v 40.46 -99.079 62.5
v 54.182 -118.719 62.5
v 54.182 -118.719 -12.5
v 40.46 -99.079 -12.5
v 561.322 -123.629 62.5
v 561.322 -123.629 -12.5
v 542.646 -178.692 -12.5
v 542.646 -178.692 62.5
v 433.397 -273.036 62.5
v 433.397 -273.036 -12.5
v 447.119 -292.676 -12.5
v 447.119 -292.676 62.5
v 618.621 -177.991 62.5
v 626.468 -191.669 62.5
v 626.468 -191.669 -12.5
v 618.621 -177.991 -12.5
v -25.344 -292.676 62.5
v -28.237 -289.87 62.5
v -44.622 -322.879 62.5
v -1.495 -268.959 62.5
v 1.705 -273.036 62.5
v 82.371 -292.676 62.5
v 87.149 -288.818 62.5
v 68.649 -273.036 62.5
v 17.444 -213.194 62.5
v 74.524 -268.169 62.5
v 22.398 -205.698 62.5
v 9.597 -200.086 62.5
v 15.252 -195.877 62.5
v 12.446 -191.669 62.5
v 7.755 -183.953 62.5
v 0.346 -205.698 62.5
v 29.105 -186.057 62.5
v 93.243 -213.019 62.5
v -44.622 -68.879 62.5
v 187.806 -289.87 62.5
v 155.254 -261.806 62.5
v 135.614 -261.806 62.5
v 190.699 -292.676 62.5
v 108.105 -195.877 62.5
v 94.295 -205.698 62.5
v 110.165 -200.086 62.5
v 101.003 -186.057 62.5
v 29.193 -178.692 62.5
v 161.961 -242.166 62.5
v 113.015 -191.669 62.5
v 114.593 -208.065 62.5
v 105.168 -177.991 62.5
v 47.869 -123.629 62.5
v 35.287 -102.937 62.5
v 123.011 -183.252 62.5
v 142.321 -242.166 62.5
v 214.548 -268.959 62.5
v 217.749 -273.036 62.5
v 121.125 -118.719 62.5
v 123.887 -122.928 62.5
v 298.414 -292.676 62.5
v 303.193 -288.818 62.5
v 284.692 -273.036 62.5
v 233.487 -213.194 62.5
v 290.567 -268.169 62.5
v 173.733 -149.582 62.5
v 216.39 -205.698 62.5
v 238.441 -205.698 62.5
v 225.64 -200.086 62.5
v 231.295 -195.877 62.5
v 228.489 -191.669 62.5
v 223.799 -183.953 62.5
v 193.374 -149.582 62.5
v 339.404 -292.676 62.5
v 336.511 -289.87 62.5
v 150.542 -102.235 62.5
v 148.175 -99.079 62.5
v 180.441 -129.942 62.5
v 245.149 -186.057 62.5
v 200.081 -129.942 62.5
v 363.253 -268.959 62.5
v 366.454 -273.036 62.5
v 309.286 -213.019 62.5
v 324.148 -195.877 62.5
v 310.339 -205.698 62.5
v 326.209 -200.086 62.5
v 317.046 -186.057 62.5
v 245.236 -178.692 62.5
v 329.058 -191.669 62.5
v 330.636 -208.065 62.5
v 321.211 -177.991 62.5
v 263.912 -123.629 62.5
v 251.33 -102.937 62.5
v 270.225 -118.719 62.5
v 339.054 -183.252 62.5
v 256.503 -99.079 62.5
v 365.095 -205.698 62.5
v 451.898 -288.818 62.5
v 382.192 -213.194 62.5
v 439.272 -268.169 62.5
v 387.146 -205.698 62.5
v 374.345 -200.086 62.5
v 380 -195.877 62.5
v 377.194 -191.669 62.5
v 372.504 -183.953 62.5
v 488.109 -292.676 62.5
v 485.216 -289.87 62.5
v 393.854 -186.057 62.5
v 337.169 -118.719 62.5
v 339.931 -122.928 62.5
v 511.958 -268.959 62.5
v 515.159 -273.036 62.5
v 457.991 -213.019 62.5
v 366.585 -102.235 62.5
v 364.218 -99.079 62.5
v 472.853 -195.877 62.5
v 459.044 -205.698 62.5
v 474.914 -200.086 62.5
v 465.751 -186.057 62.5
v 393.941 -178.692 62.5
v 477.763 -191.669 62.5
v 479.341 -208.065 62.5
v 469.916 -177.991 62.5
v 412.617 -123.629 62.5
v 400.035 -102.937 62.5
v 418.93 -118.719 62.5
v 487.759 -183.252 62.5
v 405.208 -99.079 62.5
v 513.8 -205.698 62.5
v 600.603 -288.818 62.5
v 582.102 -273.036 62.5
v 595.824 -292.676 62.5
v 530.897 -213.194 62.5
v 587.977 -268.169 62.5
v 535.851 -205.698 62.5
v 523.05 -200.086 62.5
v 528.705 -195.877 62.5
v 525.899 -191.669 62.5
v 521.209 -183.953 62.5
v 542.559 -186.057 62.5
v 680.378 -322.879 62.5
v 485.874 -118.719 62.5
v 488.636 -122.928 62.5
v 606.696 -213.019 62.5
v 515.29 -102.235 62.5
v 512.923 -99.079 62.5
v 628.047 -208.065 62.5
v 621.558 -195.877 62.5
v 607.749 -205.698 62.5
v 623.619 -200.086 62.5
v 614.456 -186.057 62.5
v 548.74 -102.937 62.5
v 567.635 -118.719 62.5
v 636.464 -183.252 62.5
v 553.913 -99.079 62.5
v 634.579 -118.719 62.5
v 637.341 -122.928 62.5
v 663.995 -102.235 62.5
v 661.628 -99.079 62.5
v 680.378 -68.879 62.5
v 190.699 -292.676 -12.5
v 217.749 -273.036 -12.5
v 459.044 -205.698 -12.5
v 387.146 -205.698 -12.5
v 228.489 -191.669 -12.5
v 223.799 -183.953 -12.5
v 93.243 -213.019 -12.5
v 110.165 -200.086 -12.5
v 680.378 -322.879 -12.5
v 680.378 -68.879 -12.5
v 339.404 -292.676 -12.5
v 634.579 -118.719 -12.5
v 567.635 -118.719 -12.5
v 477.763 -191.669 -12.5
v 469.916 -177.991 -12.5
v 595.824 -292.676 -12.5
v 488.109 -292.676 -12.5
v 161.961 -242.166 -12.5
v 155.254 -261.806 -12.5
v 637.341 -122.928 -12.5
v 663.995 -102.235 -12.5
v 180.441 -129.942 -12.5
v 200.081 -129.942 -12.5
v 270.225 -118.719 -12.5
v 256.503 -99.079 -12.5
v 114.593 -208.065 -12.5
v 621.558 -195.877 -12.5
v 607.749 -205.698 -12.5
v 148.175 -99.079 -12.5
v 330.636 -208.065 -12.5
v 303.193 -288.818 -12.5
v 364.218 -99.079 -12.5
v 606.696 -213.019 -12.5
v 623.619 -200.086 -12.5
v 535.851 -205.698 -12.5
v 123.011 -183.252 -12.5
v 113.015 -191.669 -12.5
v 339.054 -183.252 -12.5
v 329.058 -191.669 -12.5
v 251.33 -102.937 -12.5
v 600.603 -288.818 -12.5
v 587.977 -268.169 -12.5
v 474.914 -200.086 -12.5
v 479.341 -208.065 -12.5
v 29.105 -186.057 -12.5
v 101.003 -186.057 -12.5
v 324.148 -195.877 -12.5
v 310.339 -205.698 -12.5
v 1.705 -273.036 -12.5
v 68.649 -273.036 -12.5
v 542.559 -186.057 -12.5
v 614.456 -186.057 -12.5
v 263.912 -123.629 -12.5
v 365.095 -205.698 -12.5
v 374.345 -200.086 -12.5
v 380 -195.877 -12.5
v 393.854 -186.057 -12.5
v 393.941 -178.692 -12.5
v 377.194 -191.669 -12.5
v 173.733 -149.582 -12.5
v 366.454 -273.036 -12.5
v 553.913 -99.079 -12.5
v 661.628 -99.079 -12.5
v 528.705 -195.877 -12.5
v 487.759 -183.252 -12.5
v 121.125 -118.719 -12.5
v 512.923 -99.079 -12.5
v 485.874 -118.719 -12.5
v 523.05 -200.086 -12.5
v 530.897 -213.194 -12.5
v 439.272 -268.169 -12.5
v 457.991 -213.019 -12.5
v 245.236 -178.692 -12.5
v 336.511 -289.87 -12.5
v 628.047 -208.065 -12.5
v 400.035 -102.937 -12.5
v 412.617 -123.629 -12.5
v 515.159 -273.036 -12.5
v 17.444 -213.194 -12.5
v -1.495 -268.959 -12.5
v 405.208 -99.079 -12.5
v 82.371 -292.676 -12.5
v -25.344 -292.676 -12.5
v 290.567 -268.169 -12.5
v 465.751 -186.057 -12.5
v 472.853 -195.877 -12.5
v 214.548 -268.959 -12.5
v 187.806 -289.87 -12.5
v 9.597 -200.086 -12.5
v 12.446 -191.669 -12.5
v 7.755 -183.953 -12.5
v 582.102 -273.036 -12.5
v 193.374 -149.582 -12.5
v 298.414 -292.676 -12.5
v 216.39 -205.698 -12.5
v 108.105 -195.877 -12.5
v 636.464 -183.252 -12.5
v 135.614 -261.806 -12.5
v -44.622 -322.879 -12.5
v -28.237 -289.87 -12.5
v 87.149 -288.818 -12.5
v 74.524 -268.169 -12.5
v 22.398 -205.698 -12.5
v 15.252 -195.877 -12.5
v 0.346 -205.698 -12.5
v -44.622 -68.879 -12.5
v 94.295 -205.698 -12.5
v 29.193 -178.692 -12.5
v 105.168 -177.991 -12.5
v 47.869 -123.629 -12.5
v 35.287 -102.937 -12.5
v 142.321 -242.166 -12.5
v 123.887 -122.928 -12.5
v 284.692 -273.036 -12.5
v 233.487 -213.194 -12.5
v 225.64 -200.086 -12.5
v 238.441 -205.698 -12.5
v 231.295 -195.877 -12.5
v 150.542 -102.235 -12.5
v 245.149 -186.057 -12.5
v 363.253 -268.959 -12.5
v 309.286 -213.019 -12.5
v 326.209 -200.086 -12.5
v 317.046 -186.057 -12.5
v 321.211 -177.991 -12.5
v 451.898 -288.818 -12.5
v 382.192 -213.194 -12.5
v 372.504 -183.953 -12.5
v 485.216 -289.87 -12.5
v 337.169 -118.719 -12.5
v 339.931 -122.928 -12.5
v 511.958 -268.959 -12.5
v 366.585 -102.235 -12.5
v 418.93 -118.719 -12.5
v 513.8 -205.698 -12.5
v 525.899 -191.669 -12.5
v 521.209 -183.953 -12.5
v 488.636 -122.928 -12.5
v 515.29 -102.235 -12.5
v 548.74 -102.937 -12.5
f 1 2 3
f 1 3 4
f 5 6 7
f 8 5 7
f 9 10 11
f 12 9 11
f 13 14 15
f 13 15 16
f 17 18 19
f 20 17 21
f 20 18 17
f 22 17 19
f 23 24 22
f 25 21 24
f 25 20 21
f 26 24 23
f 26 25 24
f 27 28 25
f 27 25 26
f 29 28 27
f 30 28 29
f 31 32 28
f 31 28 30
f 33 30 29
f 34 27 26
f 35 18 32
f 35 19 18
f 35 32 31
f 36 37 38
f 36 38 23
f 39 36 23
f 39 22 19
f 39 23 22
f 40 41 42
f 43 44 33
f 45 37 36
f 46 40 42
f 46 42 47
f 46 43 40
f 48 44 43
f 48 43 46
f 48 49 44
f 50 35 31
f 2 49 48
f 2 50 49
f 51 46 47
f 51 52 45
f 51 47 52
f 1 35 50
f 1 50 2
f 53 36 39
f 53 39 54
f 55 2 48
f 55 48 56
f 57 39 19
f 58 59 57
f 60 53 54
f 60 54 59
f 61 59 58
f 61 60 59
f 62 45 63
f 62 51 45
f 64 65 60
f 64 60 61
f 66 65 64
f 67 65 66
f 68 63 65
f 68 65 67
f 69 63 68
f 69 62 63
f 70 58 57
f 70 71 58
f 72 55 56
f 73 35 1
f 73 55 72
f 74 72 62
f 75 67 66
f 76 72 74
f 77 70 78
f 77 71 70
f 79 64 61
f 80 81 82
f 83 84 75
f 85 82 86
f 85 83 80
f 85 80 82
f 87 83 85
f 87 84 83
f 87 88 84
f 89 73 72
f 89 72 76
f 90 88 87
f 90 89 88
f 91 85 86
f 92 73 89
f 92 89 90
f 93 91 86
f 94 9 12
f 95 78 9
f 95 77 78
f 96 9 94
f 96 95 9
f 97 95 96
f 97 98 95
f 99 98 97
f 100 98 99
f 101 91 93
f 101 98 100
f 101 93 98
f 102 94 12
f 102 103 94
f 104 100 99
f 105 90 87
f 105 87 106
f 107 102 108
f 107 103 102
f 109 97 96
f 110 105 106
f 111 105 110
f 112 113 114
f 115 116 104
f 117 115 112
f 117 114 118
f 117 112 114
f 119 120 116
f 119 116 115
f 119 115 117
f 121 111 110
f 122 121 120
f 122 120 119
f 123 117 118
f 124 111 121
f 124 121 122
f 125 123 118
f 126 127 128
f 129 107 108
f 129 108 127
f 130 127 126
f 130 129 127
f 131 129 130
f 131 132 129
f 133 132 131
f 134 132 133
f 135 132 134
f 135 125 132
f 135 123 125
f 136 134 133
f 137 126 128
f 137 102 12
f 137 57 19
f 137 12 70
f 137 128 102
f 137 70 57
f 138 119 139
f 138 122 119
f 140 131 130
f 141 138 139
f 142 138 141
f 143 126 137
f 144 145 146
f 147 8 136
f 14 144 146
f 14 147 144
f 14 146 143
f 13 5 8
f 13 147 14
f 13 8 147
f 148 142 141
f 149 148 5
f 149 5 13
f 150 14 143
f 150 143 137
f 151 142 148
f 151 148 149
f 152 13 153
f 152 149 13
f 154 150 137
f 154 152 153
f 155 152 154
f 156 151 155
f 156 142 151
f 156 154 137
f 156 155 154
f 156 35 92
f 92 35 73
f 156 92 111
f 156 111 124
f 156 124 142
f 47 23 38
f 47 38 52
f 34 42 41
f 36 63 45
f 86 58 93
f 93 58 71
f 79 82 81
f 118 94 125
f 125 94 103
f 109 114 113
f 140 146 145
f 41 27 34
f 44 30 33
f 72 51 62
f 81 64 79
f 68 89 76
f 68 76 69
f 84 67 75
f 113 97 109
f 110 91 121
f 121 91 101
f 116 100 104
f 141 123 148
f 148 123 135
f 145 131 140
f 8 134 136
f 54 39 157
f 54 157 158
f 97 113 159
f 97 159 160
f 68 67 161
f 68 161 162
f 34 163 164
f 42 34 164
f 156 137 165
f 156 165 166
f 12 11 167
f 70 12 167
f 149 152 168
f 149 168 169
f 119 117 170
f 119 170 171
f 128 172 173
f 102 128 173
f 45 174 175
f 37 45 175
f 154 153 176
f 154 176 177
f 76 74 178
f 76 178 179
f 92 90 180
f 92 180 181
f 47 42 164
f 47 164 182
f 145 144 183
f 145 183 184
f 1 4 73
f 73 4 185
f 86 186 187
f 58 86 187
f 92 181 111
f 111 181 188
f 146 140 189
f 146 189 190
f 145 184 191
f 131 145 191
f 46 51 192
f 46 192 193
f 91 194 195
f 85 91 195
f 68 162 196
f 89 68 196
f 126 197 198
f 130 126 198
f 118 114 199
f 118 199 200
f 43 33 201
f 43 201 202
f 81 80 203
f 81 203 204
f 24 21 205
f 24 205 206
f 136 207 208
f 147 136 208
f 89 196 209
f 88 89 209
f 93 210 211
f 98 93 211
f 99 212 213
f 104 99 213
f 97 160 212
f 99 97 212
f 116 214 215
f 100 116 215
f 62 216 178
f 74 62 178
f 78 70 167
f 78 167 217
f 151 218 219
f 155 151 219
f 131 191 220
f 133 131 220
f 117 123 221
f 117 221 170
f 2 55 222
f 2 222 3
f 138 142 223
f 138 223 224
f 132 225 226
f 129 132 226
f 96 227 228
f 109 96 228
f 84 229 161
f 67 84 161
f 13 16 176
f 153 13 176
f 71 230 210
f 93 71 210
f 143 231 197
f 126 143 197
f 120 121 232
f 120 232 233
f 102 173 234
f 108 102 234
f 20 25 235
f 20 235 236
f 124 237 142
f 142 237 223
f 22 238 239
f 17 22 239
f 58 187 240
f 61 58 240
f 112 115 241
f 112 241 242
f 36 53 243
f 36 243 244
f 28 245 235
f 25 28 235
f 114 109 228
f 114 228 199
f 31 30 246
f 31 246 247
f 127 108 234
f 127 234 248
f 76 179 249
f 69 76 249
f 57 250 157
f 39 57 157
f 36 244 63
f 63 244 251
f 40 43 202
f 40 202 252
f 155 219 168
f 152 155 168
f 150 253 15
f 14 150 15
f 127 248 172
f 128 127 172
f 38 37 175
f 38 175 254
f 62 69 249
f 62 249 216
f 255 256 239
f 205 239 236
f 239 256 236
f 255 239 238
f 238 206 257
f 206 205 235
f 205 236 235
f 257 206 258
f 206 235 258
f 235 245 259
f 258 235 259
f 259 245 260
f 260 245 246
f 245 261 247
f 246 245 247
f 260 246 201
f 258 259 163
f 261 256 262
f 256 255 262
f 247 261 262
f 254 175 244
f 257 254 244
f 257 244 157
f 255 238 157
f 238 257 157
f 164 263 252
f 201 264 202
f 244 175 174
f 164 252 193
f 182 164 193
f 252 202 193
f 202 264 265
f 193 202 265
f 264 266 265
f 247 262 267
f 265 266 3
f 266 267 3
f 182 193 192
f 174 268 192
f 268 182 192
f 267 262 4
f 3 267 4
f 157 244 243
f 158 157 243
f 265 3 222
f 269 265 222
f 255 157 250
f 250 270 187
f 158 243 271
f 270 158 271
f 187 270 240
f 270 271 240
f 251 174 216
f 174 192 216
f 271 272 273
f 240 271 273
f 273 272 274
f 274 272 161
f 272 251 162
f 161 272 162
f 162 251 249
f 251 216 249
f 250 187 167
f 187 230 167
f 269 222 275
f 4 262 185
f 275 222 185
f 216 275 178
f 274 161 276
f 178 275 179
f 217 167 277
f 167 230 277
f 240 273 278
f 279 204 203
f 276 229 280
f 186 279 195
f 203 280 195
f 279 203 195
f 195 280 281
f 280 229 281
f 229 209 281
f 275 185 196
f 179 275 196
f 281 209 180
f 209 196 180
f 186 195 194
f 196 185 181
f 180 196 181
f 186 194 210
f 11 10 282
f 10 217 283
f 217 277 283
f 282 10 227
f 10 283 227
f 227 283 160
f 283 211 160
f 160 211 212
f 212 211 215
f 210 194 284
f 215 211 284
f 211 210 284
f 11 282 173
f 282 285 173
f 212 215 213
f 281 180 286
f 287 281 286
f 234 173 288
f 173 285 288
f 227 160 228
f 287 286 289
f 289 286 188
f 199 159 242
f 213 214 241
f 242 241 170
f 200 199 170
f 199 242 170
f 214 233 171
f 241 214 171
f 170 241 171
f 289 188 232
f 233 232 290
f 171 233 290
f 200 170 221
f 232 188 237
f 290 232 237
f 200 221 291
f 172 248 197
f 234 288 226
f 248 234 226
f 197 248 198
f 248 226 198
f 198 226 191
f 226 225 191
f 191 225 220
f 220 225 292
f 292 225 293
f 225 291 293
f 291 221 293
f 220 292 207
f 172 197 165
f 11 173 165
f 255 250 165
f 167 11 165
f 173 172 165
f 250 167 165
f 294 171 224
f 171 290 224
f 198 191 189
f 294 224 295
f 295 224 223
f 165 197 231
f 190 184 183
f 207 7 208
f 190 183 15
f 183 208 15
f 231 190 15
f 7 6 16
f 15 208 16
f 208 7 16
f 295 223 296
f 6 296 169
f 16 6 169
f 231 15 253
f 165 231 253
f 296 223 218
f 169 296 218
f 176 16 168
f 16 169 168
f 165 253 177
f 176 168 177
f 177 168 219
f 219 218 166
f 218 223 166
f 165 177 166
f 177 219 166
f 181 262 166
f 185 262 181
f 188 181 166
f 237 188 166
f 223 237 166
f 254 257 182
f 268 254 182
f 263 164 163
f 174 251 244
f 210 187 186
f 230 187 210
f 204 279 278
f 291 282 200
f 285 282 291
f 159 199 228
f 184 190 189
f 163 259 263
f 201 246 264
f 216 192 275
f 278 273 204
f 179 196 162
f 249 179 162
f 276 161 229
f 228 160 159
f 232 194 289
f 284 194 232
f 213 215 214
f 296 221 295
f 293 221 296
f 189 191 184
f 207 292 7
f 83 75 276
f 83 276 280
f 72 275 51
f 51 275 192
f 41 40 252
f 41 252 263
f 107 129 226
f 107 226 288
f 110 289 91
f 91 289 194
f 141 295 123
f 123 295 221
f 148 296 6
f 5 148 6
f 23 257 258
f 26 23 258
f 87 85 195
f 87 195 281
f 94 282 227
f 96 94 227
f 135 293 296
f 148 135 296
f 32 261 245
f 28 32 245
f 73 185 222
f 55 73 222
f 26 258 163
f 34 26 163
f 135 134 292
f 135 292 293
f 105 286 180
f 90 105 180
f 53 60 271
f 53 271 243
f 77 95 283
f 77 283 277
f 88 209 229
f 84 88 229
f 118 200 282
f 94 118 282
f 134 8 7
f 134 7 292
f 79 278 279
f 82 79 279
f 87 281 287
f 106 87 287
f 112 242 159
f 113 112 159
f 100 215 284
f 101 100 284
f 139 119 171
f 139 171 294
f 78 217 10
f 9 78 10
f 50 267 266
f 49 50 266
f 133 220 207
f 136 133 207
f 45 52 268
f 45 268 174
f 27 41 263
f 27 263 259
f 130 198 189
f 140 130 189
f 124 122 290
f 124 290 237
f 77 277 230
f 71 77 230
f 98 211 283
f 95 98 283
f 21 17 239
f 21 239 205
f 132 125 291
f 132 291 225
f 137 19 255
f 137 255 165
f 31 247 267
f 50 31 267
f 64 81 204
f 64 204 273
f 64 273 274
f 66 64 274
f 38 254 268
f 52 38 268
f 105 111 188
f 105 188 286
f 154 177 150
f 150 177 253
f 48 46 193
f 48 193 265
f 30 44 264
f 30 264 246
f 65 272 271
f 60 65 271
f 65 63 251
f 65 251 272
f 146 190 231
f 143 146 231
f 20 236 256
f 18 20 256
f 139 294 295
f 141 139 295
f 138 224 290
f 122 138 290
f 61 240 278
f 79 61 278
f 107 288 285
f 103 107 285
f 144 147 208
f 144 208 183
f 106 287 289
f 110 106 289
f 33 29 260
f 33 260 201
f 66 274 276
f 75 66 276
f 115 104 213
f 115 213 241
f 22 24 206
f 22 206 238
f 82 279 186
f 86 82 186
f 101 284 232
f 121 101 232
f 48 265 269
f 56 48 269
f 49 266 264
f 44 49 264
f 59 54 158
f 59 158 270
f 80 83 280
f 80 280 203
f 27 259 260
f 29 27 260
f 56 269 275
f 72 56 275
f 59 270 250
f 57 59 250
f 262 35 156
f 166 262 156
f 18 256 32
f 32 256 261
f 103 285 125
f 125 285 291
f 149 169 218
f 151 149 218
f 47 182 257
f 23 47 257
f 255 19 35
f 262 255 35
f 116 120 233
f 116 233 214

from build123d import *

# Parameters (mm, degrees)
SKETCH_1_W            = 500
SKETCH_1_H            = 220
EXTRUDE_1_DEPTH       = 50
CUT_EXTRUDE_1_DEPTH   = 65
SKETCH_3_W            = 24.993501938
SKETCH_3_H            = 24.754329671
EXTRUDE_2_DEPTH       = 50
SKETCH_4_W            = 557.488309353
SKETCH_4_H            = 263.064748201
SKETCH_4_W_2          = 497.488309353
SKETCH_4_H_2          = 203.064748201
CUT_EXTRUDE_1_2_DEPTH = 84
SCALE_1_SCALE         = 1.5
SKETCH_8_W            = 822.232464029
SKETCH_8_H            = 353.597122302
SKETCH_8_W_2          = 722.232464029
SKETCH_8_H_2          = 253.597122302
CUT_EXTRUDE_2_DEPTH   = 180
SKETCH_9_W            = 725
SKETCH_9_H            = 254
SKETCH_9_W_2          = 708.249145706
SKETCH_9_H_2          = 240.894932361
EXTRUDE_4_DEPTH       = 75


with BuildPart() as part:
    # Эскиз1 → Бобышка-Вытянуть1 (new body)
    with BuildSketch(Plane.XY):
        with Locations((315.178539616, -203.237931197)):
            Rectangle(SKETCH_1_W, SKETCH_1_H)
        Polygon((203.546220768, -131.339893042), (185.513397027, -144.433418222), (140.884350264, -144.433418222), (131.736418609, -131.339893042), align=None, mode=Mode.SUBTRACT)
        Polygon((159.677066091, -260.404641243), (87.867263933, -260.404641243), (105.900087674, -247.311116064), (150.529134437, -247.311116064), align=None, mode=Mode.SUBTRACT)
        Polygon((116.392443789, -207.416781531), (103.766544509, -244.593040524), (85.938307098, -258.534137646), (104.994062494, -202.419029733), (111.160879041, -198.678022538), align=None, mode=Mode.SUBTRACT)
        Polygon((109.933361055, -187.922626855), (128.287677602, -133.911835488), (136.67571717, -147.706799517), (124.225177602, -184.41543261), (113.060609257, -193.066511747), align=None, mode=Mode.SUBTRACT)
        Polygon((181.158630839, -203.997267143), (162.86276753, -257.832698797), (154.445501343, -244.066961387), (166.92526753, -207.299875056), (178.20674235, -198.678022538), align=None, mode=Mode.SUBTRACT)
        Polygon((174.874907818, -183.947806711), (187.354674005, -147.239173618), (205.124458178, -133.444209589), (186.770141631, -187.455000956), (180.106472566, -193.066511747), align=None, mode=Mode.SUBTRACT)
        Polygon((172.098379041, -189.325504553), (176.833091271, -195.872267143), (167.626706379, -202.419029733), (119.695051703, -202.419029733), (114.931112854, -195.872267143), (124.166724365, -189.325504553), align=None, mode=Mode.SUBTRACT)
        Polygon((188.173019329, -260.404641243), (192.615465372, -247.311116064), (205.708990552, -247.311116064), (201.266544509, -260.404641243), align=None, mode=Mode.SUBTRACT)
        Polygon((220.585339473, -165.00895779), (225.057012134, -151.91543261), (238.150537314, -151.91543261), (233.678864652, -165.00895779), align=None, mode=Mode.SUBTRACT)
        Polygon((347.574997746, -131.339893042), (329.542174005, -144.433418222), (284.913127242, -144.433418222), (275.765195588, -131.339893042), align=None, mode=Mode.SUBTRACT)
        Polygon((303.70584307, -260.404641243), (231.896040911, -260.404641243), (249.928864652, -247.311116064), (294.557911415, -247.311116064), align=None, mode=Mode.SUBTRACT)
        Polygon((260.421220768, -207.416781531), (247.795321487, -244.593040524), (229.967084077, -258.534137646), (249.022839473, -202.419029733), (255.189656019, -198.678022538), align=None, mode=Mode.SUBTRACT)
        Polygon((253.962138034, -187.922626855), (272.31645458, -133.911835488), (280.704494149, -147.706799517), (268.25395458, -184.41543261), (257.089386235, -193.066511747), align=None, mode=Mode.SUBTRACT)
        Polygon((325.187407818, -203.997267143), (306.891544509, -257.832698797), (298.474278321, -244.066961387), (310.954044509, -207.299875056), (322.235519329, -198.678022538), align=None, mode=Mode.SUBTRACT)
        Polygon((318.903684796, -183.947806711), (331.383450983, -147.239173618), (349.153235156, -133.444209589), (330.798918609, -187.455000956), (324.135249545, -193.066511747), align=None, mode=Mode.SUBTRACT)
        Polygon((316.127156019, -189.325504553), (320.86186825, -195.872267143), (311.655483357, -202.419029733), (263.723828681, -202.419029733), (258.959889832, -195.872267143), (268.195501343, -189.325504553), align=None, mode=Mode.SUBTRACT)
        Polygon((446.711688393, -131.339893042), (428.678864652, -144.433418222), (384.04981789, -144.433418222), (374.901886235, -131.339893042), align=None, mode=Mode.SUBTRACT)
        Polygon((402.842533717, -260.404641243), (331.032731559, -260.404641243), (349.0655553, -247.311116064), (393.694602063, -247.311116064), align=None, mode=Mode.SUBTRACT)
        Polygon((359.557911415, -207.416781531), (346.932012134, -244.593040524), (329.103774724, -258.534137646), (348.15953012, -202.419029733), (354.326346667, -198.678022538), align=None, mode=Mode.SUBTRACT)
        Polygon((353.098828681, -187.922626855), (371.453145228, -133.911835488), (379.841184796, -147.706799517), (367.390645228, -184.41543261), (356.226076883, -193.066511747), align=None, mode=Mode.SUBTRACT)
        Polygon((424.324098465, -203.997267143), (406.028235156, -257.832698797), (397.610968969, -244.066961387), (410.090735156, -207.299875056), (421.372209976, -198.678022538), align=None, mode=Mode.SUBTRACT)
        Polygon((418.040375444, -183.947806711), (430.520141631, -147.239173618), (448.289925804, -133.444209589), (429.935609257, -187.455000956), (423.271940192, -193.066511747), align=None, mode=Mode.SUBTRACT)
        Polygon((415.263846667, -189.325504553), (419.998558897, -195.872267143), (410.792174005, -202.419029733), (362.860519329, -202.419029733), (358.09658048, -195.872267143), (367.332191991, -189.325504553), align=None, mode=Mode.SUBTRACT)
        Polygon((545.848379041, -131.339893042), (527.8155553, -144.433418222), (483.186508537, -144.433418222), (474.038576883, -131.339893042), align=None, mode=Mode.SUBTRACT)
        Polygon((501.979224365, -260.404641243), (430.169422206, -260.404641243), (448.202245947, -247.311116064), (492.83129271, -247.311116064), align=None, mode=Mode.SUBTRACT)
        Polygon((458.694602063, -207.416781531), (446.068702782, -244.593040524), (428.240465372, -258.534137646), (447.296220768, -202.419029733), (453.463037314, -198.678022538), align=None, mode=Mode.SUBTRACT)
        Polygon((452.235519329, -187.922626855), (470.589835875, -133.911835488), (478.977875444, -147.706799517), (466.527335875, -184.41543261), (455.36276753, -193.066511747), align=None, mode=Mode.SUBTRACT)
        Polygon((523.460789113, -203.997267143), (505.164925804, -257.832698797), (496.747659616, -244.066961387), (509.227425804, -207.299875056), (520.508900624, -198.678022538), align=None, mode=Mode.SUBTRACT)
        Polygon((517.177066091, -183.947806711), (529.656832278, -147.239173618), (547.426616451, -133.444209589), (529.072299904, -187.455000956), (522.408630839, -193.066511747), align=None, mode=Mode.SUBTRACT)
        Polygon((514.400537314, -189.325504553), (519.135249545, -195.872267143), (509.928864652, -202.419029733), (461.997209976, -202.419029733), (457.233271127, -195.872267143), (466.468882638, -189.325504553), align=None, mode=Mode.SUBTRACT)
    extrude(amount=EXTRUDE_1_DEPTH)

    # Эскиз2 → Cut-Extrude 1 (cut)
    with BuildSketch(Plane.XY.offset(50)):
        Polygon((225.057012134, -151.91543261), (238.150537314, -151.91543261), (233.678864652, -165.00895779), (220.585339473, -165.00895779), align=None)
        Polygon((199.643902872, -226.731116064), (212.737428052, -226.731116064), (208.26575539, -239.824641243), (195.17223021, -239.824641243), align=None)
    extrude(amount=-CUT_EXTRUDE_1_DEPTH, mode=Mode.SUBTRACT)

    # Эскиз3 → Бобышка-Вытянуть2 (add)
    with BuildSketch(Plane.XY.offset(50)):
        with Locations((196.457377331, -256.289777907)):
            Rectangle(SKETCH_3_W, SKETCH_3_H)
    extrude(amount=-EXTRUDE_2_DEPTH)

    # Эскиз4 → Cut-Extrude 1 2 (cut)
    with BuildSketch(Plane.XY.offset(50)):
        with Locations((316.682461775, -195.872267142)):
            Rectangle(SKETCH_4_W, SKETCH_4_H)
        with Locations((316.682461775, -195.872267142)):
            Rectangle(SKETCH_4_W_2, SKETCH_4_H_2, mode=Mode.SUBTRACT)
    extrude(amount=-CUT_EXTRUDE_1_2_DEPTH, mode=Mode.SUBTRACT)


with BuildPart() as part_1:
    # Масштаб1: scaled about (314.289349403, -195.861916492, 25)
    add(part.part.scale(SCALE_1_SCALE).moved(Location((-157.144674702, 97.930958246, -12.5))))

    # Эскиз8 → Вырез-Вытянуть-Тонкостенный2 (cut)
    with BuildSketch(Plane.XY.offset(62.5)):
        with Locations((317.879017961, -195.877442468)):
            Rectangle(SKETCH_8_W, SKETCH_8_H)
        with Locations((317.879017961, -195.877442468)):
            Rectangle(SKETCH_8_W_2, SKETCH_8_H_2, mode=Mode.SUBTRACT)
    extrude(amount=-CUT_EXTRUDE_2_DEPTH, mode=Mode.SUBTRACT)

    # Эскиз9 → Бобышка-Вытянуть4 (add)
    with BuildSketch(Plane.XY.offset(62.5)):
        with Locations((317.877785946, -195.878881317)):
            Rectangle(SKETCH_9_W, SKETCH_9_H)
        with Locations((317.250065853, -196.40613993)):
            Rectangle(SKETCH_9_W_2, SKETCH_9_H_2, mode=Mode.SUBTRACT)
    extrude(amount=-EXTRUDE_4_DEPTH)


solid = part_1.part
